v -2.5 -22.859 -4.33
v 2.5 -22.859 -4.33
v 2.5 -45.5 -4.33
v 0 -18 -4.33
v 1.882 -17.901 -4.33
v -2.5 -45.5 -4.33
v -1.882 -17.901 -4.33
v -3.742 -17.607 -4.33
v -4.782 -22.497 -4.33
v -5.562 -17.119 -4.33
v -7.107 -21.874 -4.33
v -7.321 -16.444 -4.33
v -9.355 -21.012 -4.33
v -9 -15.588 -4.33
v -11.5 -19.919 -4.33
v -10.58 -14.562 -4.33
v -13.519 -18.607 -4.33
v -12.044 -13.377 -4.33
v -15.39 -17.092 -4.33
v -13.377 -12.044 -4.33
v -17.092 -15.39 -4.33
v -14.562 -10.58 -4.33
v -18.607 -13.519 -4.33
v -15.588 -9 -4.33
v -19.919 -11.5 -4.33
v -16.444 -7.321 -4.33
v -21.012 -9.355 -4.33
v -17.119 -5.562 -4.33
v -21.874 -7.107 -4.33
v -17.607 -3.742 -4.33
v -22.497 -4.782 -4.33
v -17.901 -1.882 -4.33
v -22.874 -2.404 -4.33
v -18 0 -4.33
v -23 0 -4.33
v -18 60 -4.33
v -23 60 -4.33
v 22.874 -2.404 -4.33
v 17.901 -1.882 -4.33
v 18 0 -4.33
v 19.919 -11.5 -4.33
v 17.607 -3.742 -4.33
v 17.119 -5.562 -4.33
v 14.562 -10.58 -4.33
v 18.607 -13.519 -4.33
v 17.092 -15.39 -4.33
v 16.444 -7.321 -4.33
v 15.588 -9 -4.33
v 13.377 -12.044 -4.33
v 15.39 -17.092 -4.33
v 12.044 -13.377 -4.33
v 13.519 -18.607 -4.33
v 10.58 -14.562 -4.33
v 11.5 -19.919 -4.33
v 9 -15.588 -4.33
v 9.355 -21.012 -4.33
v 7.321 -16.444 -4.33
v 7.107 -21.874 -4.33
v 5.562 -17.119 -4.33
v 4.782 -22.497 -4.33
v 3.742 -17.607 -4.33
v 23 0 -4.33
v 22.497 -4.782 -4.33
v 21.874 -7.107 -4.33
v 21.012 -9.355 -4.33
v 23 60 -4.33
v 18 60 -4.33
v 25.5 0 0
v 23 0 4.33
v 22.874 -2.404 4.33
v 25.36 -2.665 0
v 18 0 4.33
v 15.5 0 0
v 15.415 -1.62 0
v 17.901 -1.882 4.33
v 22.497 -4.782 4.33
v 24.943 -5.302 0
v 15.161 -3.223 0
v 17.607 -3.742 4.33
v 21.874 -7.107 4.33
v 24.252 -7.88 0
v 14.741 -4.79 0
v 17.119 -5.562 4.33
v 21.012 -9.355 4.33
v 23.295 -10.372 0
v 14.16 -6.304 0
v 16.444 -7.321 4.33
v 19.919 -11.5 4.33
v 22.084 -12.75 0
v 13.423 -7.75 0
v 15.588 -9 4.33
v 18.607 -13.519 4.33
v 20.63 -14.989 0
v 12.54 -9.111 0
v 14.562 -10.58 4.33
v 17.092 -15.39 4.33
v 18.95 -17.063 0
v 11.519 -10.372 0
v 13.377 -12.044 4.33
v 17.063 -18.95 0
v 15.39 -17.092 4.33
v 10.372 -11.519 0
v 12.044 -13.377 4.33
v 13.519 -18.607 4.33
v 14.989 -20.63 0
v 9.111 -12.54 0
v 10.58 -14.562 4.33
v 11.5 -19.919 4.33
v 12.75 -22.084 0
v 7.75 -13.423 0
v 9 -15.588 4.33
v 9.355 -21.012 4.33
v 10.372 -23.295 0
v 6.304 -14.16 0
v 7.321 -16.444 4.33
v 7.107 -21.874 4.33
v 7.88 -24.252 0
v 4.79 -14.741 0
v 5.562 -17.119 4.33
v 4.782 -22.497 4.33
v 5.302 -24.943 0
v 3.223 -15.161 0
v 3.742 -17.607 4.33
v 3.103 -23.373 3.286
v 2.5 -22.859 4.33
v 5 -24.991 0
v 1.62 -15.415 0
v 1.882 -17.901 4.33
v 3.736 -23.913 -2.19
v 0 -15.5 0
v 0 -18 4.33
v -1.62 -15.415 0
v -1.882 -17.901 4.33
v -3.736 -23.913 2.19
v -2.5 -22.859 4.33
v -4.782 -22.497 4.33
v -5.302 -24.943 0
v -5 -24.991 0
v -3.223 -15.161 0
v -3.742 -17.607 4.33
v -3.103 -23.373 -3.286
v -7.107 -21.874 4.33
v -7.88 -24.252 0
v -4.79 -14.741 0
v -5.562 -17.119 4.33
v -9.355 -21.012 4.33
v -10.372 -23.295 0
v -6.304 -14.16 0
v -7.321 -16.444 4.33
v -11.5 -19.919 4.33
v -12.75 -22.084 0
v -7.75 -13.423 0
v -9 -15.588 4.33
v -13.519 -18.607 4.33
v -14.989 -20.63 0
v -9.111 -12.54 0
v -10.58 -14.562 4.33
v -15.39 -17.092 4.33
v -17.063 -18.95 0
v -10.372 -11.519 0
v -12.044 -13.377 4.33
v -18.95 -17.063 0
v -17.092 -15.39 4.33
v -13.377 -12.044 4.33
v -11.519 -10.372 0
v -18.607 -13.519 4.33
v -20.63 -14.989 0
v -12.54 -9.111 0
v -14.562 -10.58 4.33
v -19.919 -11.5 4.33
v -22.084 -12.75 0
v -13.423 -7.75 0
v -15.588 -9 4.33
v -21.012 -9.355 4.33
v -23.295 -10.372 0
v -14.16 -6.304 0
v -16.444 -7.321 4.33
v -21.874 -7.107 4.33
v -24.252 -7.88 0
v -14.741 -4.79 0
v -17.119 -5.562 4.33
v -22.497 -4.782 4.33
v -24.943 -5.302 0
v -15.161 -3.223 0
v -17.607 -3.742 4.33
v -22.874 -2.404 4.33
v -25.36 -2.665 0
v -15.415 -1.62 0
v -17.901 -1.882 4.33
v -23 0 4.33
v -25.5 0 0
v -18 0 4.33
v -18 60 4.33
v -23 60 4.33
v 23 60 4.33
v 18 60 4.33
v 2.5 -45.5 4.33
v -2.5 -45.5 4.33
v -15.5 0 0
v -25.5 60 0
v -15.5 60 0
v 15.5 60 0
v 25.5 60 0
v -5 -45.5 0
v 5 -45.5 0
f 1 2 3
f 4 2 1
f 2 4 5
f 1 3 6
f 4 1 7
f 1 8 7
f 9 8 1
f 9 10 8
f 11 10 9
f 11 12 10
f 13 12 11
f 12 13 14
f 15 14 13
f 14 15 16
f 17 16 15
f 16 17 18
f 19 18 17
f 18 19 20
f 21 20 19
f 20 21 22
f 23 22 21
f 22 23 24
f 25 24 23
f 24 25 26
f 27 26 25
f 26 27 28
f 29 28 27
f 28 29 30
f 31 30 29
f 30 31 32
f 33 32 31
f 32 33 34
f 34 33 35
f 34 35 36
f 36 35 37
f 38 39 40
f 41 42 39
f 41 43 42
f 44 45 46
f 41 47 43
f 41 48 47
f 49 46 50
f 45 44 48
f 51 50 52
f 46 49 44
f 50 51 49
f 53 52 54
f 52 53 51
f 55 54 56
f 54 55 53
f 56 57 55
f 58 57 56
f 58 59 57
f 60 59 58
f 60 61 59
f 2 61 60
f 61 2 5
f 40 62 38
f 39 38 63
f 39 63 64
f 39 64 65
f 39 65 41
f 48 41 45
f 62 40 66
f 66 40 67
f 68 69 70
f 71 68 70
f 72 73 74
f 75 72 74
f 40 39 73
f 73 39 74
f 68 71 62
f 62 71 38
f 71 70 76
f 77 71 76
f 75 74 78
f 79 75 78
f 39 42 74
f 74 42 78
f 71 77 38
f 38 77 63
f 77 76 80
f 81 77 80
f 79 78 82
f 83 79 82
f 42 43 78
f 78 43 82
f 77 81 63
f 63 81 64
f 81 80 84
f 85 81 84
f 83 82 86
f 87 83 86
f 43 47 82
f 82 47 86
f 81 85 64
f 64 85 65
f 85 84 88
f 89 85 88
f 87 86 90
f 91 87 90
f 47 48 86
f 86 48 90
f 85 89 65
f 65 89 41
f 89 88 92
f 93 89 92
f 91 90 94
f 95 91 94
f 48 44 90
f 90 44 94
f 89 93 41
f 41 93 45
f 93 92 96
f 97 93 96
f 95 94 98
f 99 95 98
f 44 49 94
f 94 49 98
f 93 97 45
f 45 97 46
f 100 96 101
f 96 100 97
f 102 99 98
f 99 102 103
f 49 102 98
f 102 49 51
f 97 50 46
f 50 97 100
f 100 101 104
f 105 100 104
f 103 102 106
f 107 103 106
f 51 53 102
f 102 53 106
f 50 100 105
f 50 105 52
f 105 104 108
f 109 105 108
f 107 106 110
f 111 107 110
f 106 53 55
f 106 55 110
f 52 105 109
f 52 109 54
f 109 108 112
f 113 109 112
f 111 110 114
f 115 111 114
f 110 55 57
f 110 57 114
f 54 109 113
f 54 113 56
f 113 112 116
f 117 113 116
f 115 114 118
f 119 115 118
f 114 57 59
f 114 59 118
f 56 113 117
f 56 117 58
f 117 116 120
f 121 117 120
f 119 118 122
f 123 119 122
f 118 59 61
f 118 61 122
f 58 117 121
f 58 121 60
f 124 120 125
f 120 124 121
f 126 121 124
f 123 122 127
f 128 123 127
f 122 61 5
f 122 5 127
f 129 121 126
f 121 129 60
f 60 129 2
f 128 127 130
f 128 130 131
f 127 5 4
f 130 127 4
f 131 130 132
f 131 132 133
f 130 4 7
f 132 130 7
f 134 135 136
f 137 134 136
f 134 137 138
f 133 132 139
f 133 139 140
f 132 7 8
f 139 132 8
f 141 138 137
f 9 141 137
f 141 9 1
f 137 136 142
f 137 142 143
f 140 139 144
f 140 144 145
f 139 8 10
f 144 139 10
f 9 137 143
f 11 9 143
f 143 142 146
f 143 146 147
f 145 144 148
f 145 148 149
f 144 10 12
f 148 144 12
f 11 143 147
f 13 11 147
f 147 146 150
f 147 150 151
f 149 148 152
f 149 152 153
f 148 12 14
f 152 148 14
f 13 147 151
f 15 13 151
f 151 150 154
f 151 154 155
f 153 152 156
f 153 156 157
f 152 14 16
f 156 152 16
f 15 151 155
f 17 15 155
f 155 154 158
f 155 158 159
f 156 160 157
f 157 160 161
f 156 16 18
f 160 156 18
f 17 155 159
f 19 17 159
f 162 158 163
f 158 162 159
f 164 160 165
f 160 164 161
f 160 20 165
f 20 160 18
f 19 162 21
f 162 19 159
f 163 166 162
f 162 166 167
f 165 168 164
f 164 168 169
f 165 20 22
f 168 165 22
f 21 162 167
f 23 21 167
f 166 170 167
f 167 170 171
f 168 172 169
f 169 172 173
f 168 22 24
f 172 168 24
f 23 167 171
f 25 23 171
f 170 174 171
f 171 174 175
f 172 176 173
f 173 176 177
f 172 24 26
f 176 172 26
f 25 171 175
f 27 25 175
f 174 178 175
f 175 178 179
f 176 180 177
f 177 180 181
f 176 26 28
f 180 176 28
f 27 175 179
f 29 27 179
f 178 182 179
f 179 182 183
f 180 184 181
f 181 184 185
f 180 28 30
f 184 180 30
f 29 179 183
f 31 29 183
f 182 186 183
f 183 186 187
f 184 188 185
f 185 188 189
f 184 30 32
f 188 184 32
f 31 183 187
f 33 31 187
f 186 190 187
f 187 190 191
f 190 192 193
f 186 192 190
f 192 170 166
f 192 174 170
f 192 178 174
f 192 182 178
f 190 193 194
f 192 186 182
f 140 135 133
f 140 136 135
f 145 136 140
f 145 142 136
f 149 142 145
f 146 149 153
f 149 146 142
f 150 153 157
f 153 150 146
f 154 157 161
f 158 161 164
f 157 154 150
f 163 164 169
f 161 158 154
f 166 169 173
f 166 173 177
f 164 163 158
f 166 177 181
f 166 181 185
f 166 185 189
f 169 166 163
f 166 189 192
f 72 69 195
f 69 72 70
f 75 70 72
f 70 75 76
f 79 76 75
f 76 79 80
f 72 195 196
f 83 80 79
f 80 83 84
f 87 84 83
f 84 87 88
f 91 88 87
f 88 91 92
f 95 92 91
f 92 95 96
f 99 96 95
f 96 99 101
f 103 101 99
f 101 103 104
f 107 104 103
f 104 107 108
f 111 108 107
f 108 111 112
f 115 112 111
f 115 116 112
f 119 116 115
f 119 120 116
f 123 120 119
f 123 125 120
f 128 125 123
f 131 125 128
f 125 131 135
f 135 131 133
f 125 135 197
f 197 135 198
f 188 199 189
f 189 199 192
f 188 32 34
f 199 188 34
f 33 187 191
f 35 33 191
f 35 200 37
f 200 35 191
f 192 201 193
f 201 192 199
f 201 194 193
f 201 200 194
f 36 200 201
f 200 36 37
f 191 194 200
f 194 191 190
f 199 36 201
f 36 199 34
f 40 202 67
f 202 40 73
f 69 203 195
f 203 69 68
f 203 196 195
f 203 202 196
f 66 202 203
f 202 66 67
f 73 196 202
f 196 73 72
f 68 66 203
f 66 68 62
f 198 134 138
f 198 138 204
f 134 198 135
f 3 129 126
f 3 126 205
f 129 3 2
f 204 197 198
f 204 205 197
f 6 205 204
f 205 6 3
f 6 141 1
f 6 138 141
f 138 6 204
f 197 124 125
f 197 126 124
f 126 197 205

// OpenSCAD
// file: leverMounting.scad
use <presser.scad>
use <leverArms.scad>

mountingDistance = 18;
mountingBottomHoleCenter = 2;
function mountingHoles_getBottomPosition() = [0,0,mountingBottomHoleCenter];
function mountingHoles_getTopPosition() = [0,0,mountingBottomHoleCenter + mountingDistance];
presserR = presser_getR();
holeR = 1;


module mountingHoles(ang = 0)
{
    translate([0,0,mountingDistance/2 + mountingBottomHoleCenter]) rotate([ang,0,0])    union()
    {
        #translate([-presserR - 15, 0, mountingDistance / 2]) rotate([0, 90, 0]) cylinder(h = 2 * presserR + 30, r = holeR, $fn =32);
        #translate([-presserR - 15, 0, -mountingDistance / 2]) rotate([0, 90, 0]) cylinder(h = 2 * presserR + 30, r = holeR, $fn =32);
    }
    
}
mountingHoles();
// file: presser.scad
use <leverMounting.scad>


radious = 15;
thickness = 4;
height = 25;

function presser_getR() = radious;
function getPresserAng() = 2;

presser();
module presser()
{
    difference()
    {
        cylinder(h = height, r = radious, $fn =64);
        translate([0,0,-1])cylinder(h = height + 2, r = radious - thickness);
        
        mountingHoles(getPresserAng());
    }
    
}
// file: leverArms.scad
use <presser.scad>

armsLen = 60;
distanceR = presser_getR() + 0.5;
profileR = 5;

function leverArms_getProfileR() =  profileR;
function leverArms_getDistanceR() = distanceR;



module leverArms_profile()
{
    circle(r = profileR, $fn = 6);
}

module leverArms()
{
    union()
    {
        translate([-(distanceR + profileR), 0, 0]) rotate([-90,0,0])  linear_extrude(    armsLen) leverArms_profile();
        translate([+(distanceR + profileR), 0, 0]) rotate([-90,0,0])  linear_extrude(    armsLen) leverArms_profile();
    }
}
leverArms();
// main file
use <leverArms.scad>

armFinishLen = 25;
profileR = leverArms_getProfileR();
distanceR = leverArms_getDistanceR();



module handle()
{
    module U_helper()
    {
        E = distanceR + 2 * profileR;
        translate([-E,0,-profileR]) cube([2 * E, E, 2 * profileR]);
    }

    module U_shape()
    {
        difference()
        {
            rotate_extrude(convexity = 10, $fn = 60)
            translate([distanceR + profileR, 0, 0])
            leverArms_profile();
            U_helper();
        }
    }

    union()
    {
        U_shape();
        translate([0, -(distanceR + profileR), 0]) rotate([90,0,0])  linear_extrude( armFinishLen) circle(r = profileR, $fn = 6);
        leverArms();
    }
}
handle();
